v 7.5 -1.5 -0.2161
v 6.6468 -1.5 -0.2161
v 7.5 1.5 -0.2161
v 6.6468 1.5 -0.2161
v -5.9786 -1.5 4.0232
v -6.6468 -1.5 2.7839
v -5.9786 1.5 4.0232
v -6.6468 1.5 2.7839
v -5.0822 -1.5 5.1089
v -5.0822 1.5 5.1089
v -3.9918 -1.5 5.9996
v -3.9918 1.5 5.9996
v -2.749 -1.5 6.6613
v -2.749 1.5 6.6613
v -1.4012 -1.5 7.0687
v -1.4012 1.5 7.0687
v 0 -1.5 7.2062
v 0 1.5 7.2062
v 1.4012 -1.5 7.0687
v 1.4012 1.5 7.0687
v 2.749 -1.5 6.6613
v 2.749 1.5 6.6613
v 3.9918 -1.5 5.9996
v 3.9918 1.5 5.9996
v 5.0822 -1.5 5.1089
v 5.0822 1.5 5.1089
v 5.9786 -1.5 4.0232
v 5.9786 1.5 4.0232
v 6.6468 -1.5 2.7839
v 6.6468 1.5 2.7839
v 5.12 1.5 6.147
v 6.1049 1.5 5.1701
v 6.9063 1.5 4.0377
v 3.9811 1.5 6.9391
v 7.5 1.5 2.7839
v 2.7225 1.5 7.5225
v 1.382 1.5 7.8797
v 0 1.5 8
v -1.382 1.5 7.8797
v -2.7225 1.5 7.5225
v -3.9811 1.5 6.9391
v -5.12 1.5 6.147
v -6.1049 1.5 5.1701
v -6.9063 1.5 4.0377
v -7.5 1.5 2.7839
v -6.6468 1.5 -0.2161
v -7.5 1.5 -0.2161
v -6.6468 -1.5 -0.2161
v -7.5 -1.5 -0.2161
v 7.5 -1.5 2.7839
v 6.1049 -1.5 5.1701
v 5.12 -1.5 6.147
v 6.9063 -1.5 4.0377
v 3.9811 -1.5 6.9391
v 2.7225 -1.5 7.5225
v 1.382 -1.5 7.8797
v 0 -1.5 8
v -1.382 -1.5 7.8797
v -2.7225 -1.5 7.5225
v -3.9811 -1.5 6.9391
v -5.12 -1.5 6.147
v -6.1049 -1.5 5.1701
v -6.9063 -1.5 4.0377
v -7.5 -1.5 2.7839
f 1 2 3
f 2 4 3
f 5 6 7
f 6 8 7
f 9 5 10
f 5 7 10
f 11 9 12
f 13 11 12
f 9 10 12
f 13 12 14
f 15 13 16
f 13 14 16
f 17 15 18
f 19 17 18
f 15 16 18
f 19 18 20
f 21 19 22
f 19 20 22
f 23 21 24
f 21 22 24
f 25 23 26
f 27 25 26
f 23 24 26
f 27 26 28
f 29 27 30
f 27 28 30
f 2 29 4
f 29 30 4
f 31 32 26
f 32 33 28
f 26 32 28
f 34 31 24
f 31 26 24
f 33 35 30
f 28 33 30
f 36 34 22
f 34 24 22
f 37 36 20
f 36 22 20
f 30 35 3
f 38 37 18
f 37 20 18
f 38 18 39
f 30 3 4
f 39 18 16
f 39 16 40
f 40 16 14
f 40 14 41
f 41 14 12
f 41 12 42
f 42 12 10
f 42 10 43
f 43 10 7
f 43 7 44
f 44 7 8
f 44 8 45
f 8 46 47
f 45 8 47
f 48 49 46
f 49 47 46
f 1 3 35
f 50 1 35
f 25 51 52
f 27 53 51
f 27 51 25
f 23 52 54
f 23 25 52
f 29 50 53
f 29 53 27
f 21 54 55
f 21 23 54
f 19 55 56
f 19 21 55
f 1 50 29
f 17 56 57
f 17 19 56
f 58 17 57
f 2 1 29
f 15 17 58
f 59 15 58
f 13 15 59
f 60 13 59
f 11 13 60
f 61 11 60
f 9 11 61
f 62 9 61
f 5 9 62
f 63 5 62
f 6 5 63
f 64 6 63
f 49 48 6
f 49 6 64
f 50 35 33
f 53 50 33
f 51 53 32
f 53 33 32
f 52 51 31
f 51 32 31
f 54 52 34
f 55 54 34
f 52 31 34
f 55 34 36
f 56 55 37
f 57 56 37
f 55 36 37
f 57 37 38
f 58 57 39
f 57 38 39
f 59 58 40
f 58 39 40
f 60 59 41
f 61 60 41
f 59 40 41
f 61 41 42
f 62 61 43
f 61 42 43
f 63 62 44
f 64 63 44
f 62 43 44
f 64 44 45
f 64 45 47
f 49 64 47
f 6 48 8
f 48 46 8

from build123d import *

# Parameters (mm, degrees)
BOSS_EXTRUDE1_DEPTH = 1.5


with BuildPart() as part:
    # Sketch1 → Boss-Extrude1 (new, symmetric)
    with BuildSketch(Plane(origin=(0, 0, 0), x_dir=(1, 0, 0), z_dir=(0, 1, 0))):
        with BuildLine():
            Line((-7.5, -2.783882181), (-7.5, 0.216117819))
            Line((-7.5, 0.216117819), (-6.646806682, 0.216117819))
            Line((-6.646806682, 0.216117819), (-6.646806682, -2.783882181))
            ThreePointArc((-6.646806682, -2.783882181), (0, -7.20625), (6.646806682, -2.783882181))
            Line((6.646806682, -2.783882181), (6.646806682, 0.216117819))
            Line((6.646806682, 0.216117819), (7.5, 0.216117819))
            Line((7.5, 0.216117819), (7.5, -2.783882181))
            ThreePointArc((7.5, -2.783882181), (0, -8), (-7.5, -2.783882181))
        make_face()
    extrude(amount=BOSS_EXTRUDE1_DEPTH, both=True)


solid = part.part
